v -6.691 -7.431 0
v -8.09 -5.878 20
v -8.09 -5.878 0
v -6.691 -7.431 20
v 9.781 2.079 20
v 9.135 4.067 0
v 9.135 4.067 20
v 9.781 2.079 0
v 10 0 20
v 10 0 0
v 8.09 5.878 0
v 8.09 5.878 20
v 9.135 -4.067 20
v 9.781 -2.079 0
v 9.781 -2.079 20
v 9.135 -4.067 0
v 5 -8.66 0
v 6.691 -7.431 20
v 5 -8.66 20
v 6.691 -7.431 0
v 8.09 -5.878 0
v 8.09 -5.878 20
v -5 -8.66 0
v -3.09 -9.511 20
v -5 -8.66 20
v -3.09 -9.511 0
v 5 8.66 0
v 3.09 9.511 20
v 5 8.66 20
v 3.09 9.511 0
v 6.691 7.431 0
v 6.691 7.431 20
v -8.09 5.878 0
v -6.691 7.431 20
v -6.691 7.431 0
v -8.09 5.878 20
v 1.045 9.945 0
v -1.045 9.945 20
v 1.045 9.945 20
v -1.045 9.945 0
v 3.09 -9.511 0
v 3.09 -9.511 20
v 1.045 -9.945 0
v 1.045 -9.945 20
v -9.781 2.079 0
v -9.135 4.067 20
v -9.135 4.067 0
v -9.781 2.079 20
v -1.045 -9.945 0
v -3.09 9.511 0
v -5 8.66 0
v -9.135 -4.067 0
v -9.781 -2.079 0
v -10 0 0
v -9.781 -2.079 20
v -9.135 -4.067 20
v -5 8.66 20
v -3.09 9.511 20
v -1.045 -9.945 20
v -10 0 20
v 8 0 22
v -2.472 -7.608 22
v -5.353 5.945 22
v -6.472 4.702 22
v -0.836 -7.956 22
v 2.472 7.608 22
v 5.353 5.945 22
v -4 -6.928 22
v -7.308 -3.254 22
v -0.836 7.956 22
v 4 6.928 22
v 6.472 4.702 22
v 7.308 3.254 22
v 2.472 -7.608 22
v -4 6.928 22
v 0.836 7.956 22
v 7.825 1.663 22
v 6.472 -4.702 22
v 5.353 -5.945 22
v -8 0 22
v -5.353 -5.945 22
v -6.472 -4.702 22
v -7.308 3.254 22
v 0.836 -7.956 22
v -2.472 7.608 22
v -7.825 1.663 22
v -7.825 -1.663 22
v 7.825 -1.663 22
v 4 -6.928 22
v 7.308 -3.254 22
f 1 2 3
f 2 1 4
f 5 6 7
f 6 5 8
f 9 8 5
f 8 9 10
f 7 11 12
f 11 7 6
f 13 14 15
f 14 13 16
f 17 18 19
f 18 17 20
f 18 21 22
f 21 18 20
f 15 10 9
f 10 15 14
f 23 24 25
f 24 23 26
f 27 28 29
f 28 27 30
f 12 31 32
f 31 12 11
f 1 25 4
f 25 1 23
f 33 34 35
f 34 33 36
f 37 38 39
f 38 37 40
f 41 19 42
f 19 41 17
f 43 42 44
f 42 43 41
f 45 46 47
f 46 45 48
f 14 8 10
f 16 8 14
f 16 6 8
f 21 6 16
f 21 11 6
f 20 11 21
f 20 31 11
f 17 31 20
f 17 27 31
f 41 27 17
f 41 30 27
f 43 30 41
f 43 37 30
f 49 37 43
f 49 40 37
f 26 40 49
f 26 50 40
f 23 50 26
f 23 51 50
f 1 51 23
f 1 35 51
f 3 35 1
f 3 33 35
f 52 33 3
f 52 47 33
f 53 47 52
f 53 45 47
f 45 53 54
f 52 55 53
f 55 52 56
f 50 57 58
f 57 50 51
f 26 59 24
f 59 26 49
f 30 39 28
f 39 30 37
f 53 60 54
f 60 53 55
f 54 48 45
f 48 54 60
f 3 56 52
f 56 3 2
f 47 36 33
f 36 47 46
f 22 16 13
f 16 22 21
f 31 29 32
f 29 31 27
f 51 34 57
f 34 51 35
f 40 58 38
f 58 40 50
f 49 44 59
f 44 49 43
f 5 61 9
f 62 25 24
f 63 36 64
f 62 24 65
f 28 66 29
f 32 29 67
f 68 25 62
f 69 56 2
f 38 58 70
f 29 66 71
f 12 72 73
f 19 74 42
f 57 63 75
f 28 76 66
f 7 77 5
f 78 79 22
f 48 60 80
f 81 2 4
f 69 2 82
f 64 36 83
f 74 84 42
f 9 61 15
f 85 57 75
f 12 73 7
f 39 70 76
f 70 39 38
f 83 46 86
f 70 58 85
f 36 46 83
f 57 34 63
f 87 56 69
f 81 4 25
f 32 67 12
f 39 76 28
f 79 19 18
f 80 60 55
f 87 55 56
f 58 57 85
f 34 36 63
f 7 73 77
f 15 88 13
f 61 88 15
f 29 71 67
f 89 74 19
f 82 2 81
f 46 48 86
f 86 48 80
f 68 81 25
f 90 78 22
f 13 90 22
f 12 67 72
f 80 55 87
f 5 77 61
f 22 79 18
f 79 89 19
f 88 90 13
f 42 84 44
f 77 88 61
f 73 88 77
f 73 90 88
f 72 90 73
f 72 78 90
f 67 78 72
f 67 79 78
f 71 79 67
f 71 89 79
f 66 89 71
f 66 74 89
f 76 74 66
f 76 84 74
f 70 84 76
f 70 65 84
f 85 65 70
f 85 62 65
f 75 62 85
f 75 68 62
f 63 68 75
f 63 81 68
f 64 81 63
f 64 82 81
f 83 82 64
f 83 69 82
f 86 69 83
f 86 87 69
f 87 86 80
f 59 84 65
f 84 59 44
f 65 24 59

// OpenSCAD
cylinder(h=20, r=10);
translate([0,0,20])
cylinder(h=2, r1=10, r2=8);
